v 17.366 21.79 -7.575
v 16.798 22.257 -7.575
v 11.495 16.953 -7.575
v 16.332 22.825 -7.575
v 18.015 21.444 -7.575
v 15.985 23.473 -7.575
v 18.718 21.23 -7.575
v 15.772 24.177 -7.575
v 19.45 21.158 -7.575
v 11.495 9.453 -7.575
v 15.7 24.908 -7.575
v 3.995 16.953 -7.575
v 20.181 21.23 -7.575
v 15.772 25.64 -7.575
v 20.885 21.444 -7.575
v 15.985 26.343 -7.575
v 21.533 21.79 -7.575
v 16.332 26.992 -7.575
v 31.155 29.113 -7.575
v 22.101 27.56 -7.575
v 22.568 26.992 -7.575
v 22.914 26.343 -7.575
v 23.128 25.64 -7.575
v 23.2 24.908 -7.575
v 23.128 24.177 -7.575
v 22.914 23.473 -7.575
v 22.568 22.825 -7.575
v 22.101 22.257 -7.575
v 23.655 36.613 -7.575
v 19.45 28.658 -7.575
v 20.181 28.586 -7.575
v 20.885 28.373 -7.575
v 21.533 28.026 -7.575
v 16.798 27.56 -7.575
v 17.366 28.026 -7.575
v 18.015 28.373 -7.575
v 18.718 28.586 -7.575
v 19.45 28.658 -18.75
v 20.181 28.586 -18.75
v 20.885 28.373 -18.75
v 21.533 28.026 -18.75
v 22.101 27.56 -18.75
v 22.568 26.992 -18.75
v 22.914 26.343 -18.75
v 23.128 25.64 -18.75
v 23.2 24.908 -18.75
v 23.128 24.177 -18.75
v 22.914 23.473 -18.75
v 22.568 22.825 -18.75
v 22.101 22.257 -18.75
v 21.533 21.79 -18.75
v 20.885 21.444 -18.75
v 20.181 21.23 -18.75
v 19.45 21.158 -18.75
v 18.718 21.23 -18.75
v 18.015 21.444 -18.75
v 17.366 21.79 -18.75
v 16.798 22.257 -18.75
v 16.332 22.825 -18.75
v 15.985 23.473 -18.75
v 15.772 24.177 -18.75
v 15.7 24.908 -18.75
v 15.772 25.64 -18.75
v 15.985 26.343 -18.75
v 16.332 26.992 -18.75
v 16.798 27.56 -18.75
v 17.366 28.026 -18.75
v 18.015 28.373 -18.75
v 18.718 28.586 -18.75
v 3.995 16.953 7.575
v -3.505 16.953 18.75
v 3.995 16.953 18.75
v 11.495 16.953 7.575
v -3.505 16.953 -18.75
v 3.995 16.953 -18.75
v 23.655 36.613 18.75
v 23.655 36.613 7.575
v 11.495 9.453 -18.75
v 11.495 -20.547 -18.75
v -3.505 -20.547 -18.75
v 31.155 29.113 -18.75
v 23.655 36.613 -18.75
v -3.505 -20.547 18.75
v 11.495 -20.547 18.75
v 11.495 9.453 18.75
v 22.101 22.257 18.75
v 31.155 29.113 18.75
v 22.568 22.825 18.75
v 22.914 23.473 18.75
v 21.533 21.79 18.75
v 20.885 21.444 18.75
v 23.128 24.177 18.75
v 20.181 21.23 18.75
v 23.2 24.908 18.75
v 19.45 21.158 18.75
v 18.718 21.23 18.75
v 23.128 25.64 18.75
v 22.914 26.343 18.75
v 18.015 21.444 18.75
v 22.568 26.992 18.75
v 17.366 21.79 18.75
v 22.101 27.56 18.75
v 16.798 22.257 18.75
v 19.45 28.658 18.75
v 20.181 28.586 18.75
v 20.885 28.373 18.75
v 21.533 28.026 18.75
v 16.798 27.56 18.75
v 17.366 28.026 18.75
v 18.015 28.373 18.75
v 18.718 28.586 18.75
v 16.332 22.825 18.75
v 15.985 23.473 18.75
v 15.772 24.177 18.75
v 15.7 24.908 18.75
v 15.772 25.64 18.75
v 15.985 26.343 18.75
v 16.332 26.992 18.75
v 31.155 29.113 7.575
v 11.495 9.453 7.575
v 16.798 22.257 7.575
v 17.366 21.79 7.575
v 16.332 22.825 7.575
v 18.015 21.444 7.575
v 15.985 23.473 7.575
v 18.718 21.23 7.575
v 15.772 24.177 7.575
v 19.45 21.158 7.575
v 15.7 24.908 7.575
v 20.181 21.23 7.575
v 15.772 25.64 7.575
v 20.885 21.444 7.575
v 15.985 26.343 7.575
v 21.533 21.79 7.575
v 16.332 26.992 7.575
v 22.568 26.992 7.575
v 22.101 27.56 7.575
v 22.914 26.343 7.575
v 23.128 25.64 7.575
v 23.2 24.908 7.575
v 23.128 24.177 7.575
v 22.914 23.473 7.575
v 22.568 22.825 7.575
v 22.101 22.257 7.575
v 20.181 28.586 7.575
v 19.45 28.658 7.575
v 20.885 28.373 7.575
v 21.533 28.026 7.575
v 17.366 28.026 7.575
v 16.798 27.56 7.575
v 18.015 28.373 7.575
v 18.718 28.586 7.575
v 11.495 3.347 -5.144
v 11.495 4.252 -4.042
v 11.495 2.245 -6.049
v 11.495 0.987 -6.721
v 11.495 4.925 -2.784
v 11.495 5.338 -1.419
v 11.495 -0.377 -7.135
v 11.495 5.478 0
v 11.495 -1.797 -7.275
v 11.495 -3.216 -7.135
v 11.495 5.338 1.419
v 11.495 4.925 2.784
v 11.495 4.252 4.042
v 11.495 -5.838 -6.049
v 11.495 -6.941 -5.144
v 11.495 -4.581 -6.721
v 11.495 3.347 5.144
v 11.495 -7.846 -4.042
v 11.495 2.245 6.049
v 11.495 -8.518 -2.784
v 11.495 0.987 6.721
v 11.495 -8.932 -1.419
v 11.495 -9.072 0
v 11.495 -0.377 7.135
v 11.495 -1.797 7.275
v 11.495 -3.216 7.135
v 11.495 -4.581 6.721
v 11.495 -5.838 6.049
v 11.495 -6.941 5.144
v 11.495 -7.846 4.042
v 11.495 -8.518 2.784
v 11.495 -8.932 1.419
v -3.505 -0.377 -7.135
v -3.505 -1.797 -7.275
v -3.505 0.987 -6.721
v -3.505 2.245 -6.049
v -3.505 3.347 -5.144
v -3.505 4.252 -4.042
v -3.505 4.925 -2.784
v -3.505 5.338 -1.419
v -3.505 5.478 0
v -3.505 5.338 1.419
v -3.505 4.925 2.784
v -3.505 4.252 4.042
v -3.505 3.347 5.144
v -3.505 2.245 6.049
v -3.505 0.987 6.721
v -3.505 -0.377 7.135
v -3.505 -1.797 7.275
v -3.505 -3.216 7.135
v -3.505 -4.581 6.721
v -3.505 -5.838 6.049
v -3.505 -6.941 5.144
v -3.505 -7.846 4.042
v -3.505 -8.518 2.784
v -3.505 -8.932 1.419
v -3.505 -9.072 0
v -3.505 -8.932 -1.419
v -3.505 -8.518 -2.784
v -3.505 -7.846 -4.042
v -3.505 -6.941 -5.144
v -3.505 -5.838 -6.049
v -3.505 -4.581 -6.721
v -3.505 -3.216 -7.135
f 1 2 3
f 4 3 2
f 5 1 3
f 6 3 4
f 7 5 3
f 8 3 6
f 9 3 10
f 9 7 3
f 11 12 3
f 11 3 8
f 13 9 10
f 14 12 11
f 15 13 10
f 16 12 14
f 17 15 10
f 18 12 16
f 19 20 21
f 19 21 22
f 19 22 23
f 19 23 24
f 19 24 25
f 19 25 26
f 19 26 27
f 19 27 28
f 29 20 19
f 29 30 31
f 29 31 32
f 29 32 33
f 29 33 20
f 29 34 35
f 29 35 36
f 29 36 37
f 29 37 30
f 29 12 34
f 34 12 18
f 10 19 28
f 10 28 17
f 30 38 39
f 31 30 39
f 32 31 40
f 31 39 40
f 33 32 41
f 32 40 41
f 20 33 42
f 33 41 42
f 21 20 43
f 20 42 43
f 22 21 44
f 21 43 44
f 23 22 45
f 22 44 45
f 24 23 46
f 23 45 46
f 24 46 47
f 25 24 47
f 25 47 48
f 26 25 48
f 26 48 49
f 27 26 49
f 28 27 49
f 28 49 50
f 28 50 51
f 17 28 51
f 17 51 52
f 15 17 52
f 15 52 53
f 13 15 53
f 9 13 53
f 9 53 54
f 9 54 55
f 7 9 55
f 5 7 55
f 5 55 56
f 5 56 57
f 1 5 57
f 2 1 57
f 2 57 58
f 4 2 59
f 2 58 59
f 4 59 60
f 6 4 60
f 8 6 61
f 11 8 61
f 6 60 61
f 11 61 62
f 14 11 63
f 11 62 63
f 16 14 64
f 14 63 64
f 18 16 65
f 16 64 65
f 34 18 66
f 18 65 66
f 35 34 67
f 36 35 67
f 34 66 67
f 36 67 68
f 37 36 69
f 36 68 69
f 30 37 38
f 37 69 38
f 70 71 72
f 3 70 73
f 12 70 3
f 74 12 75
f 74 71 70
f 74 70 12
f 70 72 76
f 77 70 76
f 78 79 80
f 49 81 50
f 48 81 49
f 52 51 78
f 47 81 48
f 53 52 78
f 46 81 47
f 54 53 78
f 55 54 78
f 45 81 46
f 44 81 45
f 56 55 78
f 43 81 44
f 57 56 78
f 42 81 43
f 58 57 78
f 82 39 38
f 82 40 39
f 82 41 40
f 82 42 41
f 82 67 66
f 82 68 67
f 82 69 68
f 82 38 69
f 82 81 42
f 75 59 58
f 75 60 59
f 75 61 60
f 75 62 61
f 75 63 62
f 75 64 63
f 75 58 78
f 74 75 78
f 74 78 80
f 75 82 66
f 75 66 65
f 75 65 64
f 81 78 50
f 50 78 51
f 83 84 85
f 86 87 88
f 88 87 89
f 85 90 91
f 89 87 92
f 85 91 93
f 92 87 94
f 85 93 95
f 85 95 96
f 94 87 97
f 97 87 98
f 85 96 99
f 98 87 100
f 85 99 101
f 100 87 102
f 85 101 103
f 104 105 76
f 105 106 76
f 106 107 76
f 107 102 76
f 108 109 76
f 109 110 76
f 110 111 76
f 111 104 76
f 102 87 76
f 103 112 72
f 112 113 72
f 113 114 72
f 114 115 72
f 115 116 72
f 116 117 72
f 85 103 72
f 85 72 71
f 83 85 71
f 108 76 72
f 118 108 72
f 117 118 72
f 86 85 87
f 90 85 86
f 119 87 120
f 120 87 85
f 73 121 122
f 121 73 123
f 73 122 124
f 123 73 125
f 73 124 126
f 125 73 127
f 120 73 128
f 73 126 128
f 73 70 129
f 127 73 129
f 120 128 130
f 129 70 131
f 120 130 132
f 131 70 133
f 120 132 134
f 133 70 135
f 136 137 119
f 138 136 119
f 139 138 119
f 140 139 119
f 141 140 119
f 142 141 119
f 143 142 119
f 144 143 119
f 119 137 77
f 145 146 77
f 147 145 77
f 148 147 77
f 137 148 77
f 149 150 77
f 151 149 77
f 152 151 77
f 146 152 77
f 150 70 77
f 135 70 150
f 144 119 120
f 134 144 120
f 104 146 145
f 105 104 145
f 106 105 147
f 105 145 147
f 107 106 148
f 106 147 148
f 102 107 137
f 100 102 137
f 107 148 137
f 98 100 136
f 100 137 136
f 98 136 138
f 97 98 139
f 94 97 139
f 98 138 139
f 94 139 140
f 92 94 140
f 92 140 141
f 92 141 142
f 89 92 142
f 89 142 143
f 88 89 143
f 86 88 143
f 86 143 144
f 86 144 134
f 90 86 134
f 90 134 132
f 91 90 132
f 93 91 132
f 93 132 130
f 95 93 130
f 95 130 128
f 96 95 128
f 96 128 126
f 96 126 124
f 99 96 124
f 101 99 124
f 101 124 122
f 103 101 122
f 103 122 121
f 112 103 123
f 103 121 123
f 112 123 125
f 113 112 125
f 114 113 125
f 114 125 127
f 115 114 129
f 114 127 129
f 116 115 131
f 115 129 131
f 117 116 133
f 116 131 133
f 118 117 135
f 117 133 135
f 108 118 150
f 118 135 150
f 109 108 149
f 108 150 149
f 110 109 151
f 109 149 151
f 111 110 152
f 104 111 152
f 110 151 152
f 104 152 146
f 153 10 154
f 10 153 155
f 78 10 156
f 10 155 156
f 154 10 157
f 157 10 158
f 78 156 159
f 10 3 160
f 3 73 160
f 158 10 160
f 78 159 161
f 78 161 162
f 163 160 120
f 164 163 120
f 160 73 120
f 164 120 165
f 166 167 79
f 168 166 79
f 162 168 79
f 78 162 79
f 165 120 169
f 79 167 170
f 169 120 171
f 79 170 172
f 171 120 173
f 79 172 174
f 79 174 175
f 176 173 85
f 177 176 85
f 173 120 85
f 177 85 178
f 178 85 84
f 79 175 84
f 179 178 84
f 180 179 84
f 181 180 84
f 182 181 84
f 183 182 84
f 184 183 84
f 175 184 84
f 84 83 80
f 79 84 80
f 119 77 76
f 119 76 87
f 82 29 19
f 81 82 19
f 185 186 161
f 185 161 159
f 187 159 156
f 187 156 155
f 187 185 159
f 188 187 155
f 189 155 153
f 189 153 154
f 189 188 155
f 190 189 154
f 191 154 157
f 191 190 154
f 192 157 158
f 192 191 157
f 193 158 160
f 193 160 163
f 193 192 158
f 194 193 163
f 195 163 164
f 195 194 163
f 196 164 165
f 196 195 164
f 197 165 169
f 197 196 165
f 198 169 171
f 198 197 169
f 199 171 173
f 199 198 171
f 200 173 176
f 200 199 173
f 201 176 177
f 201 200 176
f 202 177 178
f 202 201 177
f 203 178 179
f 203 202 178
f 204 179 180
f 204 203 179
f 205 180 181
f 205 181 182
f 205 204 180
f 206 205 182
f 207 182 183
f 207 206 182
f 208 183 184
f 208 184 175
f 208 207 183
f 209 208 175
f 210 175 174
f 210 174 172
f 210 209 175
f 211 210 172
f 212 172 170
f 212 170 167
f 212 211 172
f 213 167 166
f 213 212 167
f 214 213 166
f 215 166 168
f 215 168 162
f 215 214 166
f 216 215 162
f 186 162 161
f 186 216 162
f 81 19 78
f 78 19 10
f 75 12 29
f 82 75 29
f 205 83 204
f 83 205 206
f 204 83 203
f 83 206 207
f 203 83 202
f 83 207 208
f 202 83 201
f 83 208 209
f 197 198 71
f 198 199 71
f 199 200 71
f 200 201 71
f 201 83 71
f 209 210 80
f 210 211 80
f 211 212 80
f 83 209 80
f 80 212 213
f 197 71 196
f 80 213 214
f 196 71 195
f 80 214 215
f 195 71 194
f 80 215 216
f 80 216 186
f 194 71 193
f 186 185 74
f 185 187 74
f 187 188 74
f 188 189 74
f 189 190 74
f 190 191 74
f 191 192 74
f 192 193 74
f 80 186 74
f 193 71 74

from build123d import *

# Parameters (mm, degrees)
SKETCH1_W           = 25
SKETCH1_H           = 25
SKETCH1_R           = 4.85
BOSS_EXTRUDE1_DEPTH = 10
BOSS_EXTRUDE2_DEPTH = 12.5
CUT_EXTRUDE1_DEPTH  = 5.05
SKETCH4_R           = 2.5
CUT_EXTRUDE2_DEPTH  = 43.598275722
SCALE1_SCALE        = 1.5


with BuildPart() as part:
    # Sketch1 → Boss-Extrude1 (new body)
    with BuildSketch(Plane(origin=(0, 0, 0), x_dir=(0, 0, -1), z_dir=(1, 0, 0))):
        Rectangle(SKETCH1_W, SKETCH1_H)
        Circle(SKETCH1_R, mode=Mode.SUBTRACT)
    extrude(amount=BOSS_EXTRUDE1_DEPTH)

    # Sketch2 → Boss-Extrude2 (add, symmetric)
    with BuildSketch(Plane.XY):
        Polygon((5, 12.5), (18.106601718, 25.606601718), (23.106601718, 20.606601718), (10, 7.5), (10, 12.5), align=None)
    extrude(amount=BOSS_EXTRUDE2_DEPTH, both=True)

    # Sketch3 → Cut-Extrude1 (cut, symmetric)
    with BuildSketch(Plane.XY):
        Polygon((23.106601718, 20.606601718), (18.106601718, 25.606601718), (5, 12.5), (10, 12.5), (10, 7.5), align=None)
    extrude(amount=CUT_EXTRUDE1_DEPTH, both=True, mode=Mode.SUBTRACT)

    # Sketch4 → Cut-Extrude2 (cut, through all)
    with BuildSketch(Plane(origin=(0, 0, -12.5), x_dir=(-1, 0, 0), z_dir=(0, 0, -1))):
        with Locations(Location((-15.303300859, 17.803300859, 0), (0, 0, 90))):
            Circle(SKETCH4_R)
    extrude(amount=-CUT_EXTRUDE2_DEPTH, mode=Mode.SUBTRACT)


with BuildPart() as part_1:
    # Scale1: scaled about (7.010691975, 3.593426571, 0)
    add(part.part.scale(SCALE1_SCALE).moved(Location((-3.505345988, -1.796713286, 0))))


solid = part_1.part
